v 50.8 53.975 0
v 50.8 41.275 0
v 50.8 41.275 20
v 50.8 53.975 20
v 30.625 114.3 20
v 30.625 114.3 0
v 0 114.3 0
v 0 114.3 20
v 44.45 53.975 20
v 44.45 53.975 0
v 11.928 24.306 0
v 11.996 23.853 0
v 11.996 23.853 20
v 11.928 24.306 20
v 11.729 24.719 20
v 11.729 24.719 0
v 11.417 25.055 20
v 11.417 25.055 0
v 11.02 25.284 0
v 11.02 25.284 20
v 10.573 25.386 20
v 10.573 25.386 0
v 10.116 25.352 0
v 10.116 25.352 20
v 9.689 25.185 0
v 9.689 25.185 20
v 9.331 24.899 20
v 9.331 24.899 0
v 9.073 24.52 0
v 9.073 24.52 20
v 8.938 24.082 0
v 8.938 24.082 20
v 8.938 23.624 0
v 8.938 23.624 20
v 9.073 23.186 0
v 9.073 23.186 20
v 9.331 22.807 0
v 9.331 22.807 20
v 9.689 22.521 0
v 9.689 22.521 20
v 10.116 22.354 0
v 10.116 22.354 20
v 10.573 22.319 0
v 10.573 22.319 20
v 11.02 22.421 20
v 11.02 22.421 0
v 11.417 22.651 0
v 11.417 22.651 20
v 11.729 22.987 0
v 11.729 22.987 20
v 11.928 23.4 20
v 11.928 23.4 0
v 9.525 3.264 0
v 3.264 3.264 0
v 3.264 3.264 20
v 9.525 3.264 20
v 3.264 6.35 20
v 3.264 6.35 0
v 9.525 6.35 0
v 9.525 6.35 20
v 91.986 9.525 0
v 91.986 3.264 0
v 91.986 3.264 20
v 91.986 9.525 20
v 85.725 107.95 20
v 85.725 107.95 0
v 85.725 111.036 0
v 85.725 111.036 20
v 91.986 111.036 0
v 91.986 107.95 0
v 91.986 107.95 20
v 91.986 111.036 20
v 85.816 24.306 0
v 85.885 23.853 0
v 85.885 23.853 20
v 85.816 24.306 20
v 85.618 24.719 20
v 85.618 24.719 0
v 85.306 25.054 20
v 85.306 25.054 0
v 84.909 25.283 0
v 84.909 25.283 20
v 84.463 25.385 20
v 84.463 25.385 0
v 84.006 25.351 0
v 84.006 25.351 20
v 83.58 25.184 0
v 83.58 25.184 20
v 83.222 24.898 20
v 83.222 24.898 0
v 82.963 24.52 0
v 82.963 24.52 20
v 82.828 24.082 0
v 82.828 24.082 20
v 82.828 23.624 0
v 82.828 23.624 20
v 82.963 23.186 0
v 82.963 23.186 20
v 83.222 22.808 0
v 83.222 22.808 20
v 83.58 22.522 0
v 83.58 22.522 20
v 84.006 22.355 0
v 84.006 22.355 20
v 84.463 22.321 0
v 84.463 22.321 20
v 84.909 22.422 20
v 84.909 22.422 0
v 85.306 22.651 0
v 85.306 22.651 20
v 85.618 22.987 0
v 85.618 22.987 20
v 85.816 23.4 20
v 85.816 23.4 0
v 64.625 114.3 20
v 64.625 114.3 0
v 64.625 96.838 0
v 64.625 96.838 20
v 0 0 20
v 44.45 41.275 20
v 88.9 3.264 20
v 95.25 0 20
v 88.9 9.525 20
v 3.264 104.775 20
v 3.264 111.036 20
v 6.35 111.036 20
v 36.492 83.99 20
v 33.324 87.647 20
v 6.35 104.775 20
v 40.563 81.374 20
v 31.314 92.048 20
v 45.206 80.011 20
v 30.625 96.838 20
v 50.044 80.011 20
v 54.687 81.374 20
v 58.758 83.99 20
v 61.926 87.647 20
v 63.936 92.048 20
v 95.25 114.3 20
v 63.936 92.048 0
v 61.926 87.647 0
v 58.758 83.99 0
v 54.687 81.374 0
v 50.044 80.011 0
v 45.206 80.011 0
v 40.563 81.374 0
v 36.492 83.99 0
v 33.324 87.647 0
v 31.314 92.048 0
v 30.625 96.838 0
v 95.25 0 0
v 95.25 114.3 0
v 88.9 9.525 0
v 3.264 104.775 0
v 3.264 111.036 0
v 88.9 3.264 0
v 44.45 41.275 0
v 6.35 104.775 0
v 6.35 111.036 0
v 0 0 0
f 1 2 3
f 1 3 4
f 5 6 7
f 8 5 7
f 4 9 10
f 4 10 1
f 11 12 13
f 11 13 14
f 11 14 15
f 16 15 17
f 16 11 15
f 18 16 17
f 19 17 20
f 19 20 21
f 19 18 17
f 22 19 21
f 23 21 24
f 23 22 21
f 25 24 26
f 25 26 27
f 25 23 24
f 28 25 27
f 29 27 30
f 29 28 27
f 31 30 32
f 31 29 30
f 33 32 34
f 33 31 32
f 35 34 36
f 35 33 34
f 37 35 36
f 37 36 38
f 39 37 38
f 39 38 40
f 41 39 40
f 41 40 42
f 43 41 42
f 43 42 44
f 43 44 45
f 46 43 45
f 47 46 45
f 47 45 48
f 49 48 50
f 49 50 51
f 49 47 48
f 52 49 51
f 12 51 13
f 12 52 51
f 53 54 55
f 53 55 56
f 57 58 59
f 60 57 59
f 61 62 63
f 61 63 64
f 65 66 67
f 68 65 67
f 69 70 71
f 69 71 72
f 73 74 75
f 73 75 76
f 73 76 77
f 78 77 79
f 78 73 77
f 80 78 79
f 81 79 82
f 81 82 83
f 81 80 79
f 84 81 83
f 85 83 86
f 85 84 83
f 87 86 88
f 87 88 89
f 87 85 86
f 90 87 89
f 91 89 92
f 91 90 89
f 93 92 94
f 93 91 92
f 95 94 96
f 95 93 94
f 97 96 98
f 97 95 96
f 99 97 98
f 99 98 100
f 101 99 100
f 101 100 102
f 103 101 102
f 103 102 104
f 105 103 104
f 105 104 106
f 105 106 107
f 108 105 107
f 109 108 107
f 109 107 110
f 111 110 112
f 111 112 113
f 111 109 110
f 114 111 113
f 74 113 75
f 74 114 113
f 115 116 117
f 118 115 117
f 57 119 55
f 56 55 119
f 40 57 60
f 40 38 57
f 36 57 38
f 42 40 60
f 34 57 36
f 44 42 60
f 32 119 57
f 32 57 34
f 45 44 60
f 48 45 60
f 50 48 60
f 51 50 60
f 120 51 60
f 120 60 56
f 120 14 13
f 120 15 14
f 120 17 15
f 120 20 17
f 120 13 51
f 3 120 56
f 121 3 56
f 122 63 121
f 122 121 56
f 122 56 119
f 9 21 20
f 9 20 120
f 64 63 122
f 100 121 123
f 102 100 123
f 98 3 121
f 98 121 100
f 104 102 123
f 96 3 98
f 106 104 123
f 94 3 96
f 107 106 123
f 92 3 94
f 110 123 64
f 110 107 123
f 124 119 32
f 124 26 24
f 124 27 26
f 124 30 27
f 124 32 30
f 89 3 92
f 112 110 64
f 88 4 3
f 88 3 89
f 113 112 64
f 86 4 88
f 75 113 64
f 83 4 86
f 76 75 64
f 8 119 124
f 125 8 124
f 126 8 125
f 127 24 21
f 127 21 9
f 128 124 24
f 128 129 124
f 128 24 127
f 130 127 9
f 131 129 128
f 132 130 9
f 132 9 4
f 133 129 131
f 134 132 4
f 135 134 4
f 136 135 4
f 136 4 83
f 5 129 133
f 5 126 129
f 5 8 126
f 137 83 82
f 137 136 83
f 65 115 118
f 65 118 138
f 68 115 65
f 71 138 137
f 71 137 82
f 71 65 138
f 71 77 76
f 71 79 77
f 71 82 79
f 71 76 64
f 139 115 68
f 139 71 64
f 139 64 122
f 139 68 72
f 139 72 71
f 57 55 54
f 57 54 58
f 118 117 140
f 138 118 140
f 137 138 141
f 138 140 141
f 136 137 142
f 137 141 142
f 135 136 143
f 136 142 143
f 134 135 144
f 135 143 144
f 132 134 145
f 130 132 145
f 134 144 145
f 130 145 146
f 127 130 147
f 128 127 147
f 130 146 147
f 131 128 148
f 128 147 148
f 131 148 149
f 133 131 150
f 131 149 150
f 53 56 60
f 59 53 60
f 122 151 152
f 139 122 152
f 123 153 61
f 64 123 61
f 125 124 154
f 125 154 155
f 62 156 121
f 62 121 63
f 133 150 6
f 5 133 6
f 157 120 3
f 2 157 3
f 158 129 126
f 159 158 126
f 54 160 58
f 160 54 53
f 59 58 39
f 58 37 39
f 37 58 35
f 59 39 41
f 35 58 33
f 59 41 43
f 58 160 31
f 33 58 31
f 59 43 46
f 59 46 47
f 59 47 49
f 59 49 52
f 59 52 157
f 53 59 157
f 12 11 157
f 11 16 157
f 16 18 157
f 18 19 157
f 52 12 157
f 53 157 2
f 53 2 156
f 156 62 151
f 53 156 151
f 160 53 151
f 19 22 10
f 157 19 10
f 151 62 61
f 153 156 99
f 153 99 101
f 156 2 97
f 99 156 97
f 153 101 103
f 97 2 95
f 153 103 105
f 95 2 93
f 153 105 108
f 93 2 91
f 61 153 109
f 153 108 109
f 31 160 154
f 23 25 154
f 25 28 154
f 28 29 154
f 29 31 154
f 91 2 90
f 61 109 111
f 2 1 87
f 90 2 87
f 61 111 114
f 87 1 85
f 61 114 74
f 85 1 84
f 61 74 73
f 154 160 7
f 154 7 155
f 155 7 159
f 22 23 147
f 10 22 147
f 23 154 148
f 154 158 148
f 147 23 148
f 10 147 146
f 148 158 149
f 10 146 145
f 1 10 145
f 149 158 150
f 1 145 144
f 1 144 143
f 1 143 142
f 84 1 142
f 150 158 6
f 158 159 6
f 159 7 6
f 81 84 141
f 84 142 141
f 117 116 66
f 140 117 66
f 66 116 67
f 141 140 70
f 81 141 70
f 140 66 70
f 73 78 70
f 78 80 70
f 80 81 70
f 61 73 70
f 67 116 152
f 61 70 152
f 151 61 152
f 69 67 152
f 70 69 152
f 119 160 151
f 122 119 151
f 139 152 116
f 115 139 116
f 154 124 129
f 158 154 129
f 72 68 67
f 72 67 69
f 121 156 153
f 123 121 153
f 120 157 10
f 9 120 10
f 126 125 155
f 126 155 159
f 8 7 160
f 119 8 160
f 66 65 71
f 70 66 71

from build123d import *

# Parameters (mm, degrees)
SKETCH1_R           = 1.5367
SKETCH1_R_2         = 1.537816199
SKETCH1_W           = 6.2611
SKETCH1_H           = 3.0861
SKETCH1_W_2         = 6.35
SKETCH1_H_2         = 12.7
SKETCH1_W_3         = 3.0861
SKETCH1_H_3         = 6.2611
BOSS_EXTRUDE5_DEPTH = 20


with BuildPart() as part:
    # Sketch1 → Boss-Extrude5 (new body)
    with BuildSketch(Plane.XY):
        with BuildLine():
            Line((0, 0), (95.25, 0))
            Line((95.25, 0), (95.25, 114.3))
            Line((95.25, 114.3), (64.625, 114.3))
            Line((64.625, 114.3), (64.625, 96.8375))
            ThreePointArc((64.625, 96.8375), (47.625, 79.8375), (30.625, 96.8375))
            Line((30.625, 96.8375), (30.625, 114.3))
            Line((30.625, 114.3), (0, 114.3))
            Line((0, 114.3), (0, 0))
        make_face()
        with Locations((84.348005256, 23.852932932)):
            Circle(SKETCH1_R, mode=Mode.SUBTRACT)
        with Locations((10.458289057, 23.852932932)):
            Circle(SKETCH1_R_2, mode=Mode.SUBTRACT)
        with Locations((6.39445, 4.80695)):
            Rectangle(SKETCH1_W, SKETCH1_H, mode=Mode.SUBTRACT)
        with Locations((47.625, 47.625)):
            Rectangle(SKETCH1_W_2, SKETCH1_H_2, mode=Mode.SUBTRACT)
        with Locations((90.44305, 6.39445)):
            Rectangle(SKETCH1_W_3, SKETCH1_H_3, mode=Mode.SUBTRACT)
        with Locations((4.80695, 107.90555)):
            Rectangle(SKETCH1_W_3, SKETCH1_H_3, mode=Mode.SUBTRACT)
        with Locations((88.85555, 109.49305)):
            Rectangle(SKETCH1_W, SKETCH1_H, mode=Mode.SUBTRACT)
    extrude(amount=BOSS_EXTRUDE5_DEPTH)


solid = part.part
